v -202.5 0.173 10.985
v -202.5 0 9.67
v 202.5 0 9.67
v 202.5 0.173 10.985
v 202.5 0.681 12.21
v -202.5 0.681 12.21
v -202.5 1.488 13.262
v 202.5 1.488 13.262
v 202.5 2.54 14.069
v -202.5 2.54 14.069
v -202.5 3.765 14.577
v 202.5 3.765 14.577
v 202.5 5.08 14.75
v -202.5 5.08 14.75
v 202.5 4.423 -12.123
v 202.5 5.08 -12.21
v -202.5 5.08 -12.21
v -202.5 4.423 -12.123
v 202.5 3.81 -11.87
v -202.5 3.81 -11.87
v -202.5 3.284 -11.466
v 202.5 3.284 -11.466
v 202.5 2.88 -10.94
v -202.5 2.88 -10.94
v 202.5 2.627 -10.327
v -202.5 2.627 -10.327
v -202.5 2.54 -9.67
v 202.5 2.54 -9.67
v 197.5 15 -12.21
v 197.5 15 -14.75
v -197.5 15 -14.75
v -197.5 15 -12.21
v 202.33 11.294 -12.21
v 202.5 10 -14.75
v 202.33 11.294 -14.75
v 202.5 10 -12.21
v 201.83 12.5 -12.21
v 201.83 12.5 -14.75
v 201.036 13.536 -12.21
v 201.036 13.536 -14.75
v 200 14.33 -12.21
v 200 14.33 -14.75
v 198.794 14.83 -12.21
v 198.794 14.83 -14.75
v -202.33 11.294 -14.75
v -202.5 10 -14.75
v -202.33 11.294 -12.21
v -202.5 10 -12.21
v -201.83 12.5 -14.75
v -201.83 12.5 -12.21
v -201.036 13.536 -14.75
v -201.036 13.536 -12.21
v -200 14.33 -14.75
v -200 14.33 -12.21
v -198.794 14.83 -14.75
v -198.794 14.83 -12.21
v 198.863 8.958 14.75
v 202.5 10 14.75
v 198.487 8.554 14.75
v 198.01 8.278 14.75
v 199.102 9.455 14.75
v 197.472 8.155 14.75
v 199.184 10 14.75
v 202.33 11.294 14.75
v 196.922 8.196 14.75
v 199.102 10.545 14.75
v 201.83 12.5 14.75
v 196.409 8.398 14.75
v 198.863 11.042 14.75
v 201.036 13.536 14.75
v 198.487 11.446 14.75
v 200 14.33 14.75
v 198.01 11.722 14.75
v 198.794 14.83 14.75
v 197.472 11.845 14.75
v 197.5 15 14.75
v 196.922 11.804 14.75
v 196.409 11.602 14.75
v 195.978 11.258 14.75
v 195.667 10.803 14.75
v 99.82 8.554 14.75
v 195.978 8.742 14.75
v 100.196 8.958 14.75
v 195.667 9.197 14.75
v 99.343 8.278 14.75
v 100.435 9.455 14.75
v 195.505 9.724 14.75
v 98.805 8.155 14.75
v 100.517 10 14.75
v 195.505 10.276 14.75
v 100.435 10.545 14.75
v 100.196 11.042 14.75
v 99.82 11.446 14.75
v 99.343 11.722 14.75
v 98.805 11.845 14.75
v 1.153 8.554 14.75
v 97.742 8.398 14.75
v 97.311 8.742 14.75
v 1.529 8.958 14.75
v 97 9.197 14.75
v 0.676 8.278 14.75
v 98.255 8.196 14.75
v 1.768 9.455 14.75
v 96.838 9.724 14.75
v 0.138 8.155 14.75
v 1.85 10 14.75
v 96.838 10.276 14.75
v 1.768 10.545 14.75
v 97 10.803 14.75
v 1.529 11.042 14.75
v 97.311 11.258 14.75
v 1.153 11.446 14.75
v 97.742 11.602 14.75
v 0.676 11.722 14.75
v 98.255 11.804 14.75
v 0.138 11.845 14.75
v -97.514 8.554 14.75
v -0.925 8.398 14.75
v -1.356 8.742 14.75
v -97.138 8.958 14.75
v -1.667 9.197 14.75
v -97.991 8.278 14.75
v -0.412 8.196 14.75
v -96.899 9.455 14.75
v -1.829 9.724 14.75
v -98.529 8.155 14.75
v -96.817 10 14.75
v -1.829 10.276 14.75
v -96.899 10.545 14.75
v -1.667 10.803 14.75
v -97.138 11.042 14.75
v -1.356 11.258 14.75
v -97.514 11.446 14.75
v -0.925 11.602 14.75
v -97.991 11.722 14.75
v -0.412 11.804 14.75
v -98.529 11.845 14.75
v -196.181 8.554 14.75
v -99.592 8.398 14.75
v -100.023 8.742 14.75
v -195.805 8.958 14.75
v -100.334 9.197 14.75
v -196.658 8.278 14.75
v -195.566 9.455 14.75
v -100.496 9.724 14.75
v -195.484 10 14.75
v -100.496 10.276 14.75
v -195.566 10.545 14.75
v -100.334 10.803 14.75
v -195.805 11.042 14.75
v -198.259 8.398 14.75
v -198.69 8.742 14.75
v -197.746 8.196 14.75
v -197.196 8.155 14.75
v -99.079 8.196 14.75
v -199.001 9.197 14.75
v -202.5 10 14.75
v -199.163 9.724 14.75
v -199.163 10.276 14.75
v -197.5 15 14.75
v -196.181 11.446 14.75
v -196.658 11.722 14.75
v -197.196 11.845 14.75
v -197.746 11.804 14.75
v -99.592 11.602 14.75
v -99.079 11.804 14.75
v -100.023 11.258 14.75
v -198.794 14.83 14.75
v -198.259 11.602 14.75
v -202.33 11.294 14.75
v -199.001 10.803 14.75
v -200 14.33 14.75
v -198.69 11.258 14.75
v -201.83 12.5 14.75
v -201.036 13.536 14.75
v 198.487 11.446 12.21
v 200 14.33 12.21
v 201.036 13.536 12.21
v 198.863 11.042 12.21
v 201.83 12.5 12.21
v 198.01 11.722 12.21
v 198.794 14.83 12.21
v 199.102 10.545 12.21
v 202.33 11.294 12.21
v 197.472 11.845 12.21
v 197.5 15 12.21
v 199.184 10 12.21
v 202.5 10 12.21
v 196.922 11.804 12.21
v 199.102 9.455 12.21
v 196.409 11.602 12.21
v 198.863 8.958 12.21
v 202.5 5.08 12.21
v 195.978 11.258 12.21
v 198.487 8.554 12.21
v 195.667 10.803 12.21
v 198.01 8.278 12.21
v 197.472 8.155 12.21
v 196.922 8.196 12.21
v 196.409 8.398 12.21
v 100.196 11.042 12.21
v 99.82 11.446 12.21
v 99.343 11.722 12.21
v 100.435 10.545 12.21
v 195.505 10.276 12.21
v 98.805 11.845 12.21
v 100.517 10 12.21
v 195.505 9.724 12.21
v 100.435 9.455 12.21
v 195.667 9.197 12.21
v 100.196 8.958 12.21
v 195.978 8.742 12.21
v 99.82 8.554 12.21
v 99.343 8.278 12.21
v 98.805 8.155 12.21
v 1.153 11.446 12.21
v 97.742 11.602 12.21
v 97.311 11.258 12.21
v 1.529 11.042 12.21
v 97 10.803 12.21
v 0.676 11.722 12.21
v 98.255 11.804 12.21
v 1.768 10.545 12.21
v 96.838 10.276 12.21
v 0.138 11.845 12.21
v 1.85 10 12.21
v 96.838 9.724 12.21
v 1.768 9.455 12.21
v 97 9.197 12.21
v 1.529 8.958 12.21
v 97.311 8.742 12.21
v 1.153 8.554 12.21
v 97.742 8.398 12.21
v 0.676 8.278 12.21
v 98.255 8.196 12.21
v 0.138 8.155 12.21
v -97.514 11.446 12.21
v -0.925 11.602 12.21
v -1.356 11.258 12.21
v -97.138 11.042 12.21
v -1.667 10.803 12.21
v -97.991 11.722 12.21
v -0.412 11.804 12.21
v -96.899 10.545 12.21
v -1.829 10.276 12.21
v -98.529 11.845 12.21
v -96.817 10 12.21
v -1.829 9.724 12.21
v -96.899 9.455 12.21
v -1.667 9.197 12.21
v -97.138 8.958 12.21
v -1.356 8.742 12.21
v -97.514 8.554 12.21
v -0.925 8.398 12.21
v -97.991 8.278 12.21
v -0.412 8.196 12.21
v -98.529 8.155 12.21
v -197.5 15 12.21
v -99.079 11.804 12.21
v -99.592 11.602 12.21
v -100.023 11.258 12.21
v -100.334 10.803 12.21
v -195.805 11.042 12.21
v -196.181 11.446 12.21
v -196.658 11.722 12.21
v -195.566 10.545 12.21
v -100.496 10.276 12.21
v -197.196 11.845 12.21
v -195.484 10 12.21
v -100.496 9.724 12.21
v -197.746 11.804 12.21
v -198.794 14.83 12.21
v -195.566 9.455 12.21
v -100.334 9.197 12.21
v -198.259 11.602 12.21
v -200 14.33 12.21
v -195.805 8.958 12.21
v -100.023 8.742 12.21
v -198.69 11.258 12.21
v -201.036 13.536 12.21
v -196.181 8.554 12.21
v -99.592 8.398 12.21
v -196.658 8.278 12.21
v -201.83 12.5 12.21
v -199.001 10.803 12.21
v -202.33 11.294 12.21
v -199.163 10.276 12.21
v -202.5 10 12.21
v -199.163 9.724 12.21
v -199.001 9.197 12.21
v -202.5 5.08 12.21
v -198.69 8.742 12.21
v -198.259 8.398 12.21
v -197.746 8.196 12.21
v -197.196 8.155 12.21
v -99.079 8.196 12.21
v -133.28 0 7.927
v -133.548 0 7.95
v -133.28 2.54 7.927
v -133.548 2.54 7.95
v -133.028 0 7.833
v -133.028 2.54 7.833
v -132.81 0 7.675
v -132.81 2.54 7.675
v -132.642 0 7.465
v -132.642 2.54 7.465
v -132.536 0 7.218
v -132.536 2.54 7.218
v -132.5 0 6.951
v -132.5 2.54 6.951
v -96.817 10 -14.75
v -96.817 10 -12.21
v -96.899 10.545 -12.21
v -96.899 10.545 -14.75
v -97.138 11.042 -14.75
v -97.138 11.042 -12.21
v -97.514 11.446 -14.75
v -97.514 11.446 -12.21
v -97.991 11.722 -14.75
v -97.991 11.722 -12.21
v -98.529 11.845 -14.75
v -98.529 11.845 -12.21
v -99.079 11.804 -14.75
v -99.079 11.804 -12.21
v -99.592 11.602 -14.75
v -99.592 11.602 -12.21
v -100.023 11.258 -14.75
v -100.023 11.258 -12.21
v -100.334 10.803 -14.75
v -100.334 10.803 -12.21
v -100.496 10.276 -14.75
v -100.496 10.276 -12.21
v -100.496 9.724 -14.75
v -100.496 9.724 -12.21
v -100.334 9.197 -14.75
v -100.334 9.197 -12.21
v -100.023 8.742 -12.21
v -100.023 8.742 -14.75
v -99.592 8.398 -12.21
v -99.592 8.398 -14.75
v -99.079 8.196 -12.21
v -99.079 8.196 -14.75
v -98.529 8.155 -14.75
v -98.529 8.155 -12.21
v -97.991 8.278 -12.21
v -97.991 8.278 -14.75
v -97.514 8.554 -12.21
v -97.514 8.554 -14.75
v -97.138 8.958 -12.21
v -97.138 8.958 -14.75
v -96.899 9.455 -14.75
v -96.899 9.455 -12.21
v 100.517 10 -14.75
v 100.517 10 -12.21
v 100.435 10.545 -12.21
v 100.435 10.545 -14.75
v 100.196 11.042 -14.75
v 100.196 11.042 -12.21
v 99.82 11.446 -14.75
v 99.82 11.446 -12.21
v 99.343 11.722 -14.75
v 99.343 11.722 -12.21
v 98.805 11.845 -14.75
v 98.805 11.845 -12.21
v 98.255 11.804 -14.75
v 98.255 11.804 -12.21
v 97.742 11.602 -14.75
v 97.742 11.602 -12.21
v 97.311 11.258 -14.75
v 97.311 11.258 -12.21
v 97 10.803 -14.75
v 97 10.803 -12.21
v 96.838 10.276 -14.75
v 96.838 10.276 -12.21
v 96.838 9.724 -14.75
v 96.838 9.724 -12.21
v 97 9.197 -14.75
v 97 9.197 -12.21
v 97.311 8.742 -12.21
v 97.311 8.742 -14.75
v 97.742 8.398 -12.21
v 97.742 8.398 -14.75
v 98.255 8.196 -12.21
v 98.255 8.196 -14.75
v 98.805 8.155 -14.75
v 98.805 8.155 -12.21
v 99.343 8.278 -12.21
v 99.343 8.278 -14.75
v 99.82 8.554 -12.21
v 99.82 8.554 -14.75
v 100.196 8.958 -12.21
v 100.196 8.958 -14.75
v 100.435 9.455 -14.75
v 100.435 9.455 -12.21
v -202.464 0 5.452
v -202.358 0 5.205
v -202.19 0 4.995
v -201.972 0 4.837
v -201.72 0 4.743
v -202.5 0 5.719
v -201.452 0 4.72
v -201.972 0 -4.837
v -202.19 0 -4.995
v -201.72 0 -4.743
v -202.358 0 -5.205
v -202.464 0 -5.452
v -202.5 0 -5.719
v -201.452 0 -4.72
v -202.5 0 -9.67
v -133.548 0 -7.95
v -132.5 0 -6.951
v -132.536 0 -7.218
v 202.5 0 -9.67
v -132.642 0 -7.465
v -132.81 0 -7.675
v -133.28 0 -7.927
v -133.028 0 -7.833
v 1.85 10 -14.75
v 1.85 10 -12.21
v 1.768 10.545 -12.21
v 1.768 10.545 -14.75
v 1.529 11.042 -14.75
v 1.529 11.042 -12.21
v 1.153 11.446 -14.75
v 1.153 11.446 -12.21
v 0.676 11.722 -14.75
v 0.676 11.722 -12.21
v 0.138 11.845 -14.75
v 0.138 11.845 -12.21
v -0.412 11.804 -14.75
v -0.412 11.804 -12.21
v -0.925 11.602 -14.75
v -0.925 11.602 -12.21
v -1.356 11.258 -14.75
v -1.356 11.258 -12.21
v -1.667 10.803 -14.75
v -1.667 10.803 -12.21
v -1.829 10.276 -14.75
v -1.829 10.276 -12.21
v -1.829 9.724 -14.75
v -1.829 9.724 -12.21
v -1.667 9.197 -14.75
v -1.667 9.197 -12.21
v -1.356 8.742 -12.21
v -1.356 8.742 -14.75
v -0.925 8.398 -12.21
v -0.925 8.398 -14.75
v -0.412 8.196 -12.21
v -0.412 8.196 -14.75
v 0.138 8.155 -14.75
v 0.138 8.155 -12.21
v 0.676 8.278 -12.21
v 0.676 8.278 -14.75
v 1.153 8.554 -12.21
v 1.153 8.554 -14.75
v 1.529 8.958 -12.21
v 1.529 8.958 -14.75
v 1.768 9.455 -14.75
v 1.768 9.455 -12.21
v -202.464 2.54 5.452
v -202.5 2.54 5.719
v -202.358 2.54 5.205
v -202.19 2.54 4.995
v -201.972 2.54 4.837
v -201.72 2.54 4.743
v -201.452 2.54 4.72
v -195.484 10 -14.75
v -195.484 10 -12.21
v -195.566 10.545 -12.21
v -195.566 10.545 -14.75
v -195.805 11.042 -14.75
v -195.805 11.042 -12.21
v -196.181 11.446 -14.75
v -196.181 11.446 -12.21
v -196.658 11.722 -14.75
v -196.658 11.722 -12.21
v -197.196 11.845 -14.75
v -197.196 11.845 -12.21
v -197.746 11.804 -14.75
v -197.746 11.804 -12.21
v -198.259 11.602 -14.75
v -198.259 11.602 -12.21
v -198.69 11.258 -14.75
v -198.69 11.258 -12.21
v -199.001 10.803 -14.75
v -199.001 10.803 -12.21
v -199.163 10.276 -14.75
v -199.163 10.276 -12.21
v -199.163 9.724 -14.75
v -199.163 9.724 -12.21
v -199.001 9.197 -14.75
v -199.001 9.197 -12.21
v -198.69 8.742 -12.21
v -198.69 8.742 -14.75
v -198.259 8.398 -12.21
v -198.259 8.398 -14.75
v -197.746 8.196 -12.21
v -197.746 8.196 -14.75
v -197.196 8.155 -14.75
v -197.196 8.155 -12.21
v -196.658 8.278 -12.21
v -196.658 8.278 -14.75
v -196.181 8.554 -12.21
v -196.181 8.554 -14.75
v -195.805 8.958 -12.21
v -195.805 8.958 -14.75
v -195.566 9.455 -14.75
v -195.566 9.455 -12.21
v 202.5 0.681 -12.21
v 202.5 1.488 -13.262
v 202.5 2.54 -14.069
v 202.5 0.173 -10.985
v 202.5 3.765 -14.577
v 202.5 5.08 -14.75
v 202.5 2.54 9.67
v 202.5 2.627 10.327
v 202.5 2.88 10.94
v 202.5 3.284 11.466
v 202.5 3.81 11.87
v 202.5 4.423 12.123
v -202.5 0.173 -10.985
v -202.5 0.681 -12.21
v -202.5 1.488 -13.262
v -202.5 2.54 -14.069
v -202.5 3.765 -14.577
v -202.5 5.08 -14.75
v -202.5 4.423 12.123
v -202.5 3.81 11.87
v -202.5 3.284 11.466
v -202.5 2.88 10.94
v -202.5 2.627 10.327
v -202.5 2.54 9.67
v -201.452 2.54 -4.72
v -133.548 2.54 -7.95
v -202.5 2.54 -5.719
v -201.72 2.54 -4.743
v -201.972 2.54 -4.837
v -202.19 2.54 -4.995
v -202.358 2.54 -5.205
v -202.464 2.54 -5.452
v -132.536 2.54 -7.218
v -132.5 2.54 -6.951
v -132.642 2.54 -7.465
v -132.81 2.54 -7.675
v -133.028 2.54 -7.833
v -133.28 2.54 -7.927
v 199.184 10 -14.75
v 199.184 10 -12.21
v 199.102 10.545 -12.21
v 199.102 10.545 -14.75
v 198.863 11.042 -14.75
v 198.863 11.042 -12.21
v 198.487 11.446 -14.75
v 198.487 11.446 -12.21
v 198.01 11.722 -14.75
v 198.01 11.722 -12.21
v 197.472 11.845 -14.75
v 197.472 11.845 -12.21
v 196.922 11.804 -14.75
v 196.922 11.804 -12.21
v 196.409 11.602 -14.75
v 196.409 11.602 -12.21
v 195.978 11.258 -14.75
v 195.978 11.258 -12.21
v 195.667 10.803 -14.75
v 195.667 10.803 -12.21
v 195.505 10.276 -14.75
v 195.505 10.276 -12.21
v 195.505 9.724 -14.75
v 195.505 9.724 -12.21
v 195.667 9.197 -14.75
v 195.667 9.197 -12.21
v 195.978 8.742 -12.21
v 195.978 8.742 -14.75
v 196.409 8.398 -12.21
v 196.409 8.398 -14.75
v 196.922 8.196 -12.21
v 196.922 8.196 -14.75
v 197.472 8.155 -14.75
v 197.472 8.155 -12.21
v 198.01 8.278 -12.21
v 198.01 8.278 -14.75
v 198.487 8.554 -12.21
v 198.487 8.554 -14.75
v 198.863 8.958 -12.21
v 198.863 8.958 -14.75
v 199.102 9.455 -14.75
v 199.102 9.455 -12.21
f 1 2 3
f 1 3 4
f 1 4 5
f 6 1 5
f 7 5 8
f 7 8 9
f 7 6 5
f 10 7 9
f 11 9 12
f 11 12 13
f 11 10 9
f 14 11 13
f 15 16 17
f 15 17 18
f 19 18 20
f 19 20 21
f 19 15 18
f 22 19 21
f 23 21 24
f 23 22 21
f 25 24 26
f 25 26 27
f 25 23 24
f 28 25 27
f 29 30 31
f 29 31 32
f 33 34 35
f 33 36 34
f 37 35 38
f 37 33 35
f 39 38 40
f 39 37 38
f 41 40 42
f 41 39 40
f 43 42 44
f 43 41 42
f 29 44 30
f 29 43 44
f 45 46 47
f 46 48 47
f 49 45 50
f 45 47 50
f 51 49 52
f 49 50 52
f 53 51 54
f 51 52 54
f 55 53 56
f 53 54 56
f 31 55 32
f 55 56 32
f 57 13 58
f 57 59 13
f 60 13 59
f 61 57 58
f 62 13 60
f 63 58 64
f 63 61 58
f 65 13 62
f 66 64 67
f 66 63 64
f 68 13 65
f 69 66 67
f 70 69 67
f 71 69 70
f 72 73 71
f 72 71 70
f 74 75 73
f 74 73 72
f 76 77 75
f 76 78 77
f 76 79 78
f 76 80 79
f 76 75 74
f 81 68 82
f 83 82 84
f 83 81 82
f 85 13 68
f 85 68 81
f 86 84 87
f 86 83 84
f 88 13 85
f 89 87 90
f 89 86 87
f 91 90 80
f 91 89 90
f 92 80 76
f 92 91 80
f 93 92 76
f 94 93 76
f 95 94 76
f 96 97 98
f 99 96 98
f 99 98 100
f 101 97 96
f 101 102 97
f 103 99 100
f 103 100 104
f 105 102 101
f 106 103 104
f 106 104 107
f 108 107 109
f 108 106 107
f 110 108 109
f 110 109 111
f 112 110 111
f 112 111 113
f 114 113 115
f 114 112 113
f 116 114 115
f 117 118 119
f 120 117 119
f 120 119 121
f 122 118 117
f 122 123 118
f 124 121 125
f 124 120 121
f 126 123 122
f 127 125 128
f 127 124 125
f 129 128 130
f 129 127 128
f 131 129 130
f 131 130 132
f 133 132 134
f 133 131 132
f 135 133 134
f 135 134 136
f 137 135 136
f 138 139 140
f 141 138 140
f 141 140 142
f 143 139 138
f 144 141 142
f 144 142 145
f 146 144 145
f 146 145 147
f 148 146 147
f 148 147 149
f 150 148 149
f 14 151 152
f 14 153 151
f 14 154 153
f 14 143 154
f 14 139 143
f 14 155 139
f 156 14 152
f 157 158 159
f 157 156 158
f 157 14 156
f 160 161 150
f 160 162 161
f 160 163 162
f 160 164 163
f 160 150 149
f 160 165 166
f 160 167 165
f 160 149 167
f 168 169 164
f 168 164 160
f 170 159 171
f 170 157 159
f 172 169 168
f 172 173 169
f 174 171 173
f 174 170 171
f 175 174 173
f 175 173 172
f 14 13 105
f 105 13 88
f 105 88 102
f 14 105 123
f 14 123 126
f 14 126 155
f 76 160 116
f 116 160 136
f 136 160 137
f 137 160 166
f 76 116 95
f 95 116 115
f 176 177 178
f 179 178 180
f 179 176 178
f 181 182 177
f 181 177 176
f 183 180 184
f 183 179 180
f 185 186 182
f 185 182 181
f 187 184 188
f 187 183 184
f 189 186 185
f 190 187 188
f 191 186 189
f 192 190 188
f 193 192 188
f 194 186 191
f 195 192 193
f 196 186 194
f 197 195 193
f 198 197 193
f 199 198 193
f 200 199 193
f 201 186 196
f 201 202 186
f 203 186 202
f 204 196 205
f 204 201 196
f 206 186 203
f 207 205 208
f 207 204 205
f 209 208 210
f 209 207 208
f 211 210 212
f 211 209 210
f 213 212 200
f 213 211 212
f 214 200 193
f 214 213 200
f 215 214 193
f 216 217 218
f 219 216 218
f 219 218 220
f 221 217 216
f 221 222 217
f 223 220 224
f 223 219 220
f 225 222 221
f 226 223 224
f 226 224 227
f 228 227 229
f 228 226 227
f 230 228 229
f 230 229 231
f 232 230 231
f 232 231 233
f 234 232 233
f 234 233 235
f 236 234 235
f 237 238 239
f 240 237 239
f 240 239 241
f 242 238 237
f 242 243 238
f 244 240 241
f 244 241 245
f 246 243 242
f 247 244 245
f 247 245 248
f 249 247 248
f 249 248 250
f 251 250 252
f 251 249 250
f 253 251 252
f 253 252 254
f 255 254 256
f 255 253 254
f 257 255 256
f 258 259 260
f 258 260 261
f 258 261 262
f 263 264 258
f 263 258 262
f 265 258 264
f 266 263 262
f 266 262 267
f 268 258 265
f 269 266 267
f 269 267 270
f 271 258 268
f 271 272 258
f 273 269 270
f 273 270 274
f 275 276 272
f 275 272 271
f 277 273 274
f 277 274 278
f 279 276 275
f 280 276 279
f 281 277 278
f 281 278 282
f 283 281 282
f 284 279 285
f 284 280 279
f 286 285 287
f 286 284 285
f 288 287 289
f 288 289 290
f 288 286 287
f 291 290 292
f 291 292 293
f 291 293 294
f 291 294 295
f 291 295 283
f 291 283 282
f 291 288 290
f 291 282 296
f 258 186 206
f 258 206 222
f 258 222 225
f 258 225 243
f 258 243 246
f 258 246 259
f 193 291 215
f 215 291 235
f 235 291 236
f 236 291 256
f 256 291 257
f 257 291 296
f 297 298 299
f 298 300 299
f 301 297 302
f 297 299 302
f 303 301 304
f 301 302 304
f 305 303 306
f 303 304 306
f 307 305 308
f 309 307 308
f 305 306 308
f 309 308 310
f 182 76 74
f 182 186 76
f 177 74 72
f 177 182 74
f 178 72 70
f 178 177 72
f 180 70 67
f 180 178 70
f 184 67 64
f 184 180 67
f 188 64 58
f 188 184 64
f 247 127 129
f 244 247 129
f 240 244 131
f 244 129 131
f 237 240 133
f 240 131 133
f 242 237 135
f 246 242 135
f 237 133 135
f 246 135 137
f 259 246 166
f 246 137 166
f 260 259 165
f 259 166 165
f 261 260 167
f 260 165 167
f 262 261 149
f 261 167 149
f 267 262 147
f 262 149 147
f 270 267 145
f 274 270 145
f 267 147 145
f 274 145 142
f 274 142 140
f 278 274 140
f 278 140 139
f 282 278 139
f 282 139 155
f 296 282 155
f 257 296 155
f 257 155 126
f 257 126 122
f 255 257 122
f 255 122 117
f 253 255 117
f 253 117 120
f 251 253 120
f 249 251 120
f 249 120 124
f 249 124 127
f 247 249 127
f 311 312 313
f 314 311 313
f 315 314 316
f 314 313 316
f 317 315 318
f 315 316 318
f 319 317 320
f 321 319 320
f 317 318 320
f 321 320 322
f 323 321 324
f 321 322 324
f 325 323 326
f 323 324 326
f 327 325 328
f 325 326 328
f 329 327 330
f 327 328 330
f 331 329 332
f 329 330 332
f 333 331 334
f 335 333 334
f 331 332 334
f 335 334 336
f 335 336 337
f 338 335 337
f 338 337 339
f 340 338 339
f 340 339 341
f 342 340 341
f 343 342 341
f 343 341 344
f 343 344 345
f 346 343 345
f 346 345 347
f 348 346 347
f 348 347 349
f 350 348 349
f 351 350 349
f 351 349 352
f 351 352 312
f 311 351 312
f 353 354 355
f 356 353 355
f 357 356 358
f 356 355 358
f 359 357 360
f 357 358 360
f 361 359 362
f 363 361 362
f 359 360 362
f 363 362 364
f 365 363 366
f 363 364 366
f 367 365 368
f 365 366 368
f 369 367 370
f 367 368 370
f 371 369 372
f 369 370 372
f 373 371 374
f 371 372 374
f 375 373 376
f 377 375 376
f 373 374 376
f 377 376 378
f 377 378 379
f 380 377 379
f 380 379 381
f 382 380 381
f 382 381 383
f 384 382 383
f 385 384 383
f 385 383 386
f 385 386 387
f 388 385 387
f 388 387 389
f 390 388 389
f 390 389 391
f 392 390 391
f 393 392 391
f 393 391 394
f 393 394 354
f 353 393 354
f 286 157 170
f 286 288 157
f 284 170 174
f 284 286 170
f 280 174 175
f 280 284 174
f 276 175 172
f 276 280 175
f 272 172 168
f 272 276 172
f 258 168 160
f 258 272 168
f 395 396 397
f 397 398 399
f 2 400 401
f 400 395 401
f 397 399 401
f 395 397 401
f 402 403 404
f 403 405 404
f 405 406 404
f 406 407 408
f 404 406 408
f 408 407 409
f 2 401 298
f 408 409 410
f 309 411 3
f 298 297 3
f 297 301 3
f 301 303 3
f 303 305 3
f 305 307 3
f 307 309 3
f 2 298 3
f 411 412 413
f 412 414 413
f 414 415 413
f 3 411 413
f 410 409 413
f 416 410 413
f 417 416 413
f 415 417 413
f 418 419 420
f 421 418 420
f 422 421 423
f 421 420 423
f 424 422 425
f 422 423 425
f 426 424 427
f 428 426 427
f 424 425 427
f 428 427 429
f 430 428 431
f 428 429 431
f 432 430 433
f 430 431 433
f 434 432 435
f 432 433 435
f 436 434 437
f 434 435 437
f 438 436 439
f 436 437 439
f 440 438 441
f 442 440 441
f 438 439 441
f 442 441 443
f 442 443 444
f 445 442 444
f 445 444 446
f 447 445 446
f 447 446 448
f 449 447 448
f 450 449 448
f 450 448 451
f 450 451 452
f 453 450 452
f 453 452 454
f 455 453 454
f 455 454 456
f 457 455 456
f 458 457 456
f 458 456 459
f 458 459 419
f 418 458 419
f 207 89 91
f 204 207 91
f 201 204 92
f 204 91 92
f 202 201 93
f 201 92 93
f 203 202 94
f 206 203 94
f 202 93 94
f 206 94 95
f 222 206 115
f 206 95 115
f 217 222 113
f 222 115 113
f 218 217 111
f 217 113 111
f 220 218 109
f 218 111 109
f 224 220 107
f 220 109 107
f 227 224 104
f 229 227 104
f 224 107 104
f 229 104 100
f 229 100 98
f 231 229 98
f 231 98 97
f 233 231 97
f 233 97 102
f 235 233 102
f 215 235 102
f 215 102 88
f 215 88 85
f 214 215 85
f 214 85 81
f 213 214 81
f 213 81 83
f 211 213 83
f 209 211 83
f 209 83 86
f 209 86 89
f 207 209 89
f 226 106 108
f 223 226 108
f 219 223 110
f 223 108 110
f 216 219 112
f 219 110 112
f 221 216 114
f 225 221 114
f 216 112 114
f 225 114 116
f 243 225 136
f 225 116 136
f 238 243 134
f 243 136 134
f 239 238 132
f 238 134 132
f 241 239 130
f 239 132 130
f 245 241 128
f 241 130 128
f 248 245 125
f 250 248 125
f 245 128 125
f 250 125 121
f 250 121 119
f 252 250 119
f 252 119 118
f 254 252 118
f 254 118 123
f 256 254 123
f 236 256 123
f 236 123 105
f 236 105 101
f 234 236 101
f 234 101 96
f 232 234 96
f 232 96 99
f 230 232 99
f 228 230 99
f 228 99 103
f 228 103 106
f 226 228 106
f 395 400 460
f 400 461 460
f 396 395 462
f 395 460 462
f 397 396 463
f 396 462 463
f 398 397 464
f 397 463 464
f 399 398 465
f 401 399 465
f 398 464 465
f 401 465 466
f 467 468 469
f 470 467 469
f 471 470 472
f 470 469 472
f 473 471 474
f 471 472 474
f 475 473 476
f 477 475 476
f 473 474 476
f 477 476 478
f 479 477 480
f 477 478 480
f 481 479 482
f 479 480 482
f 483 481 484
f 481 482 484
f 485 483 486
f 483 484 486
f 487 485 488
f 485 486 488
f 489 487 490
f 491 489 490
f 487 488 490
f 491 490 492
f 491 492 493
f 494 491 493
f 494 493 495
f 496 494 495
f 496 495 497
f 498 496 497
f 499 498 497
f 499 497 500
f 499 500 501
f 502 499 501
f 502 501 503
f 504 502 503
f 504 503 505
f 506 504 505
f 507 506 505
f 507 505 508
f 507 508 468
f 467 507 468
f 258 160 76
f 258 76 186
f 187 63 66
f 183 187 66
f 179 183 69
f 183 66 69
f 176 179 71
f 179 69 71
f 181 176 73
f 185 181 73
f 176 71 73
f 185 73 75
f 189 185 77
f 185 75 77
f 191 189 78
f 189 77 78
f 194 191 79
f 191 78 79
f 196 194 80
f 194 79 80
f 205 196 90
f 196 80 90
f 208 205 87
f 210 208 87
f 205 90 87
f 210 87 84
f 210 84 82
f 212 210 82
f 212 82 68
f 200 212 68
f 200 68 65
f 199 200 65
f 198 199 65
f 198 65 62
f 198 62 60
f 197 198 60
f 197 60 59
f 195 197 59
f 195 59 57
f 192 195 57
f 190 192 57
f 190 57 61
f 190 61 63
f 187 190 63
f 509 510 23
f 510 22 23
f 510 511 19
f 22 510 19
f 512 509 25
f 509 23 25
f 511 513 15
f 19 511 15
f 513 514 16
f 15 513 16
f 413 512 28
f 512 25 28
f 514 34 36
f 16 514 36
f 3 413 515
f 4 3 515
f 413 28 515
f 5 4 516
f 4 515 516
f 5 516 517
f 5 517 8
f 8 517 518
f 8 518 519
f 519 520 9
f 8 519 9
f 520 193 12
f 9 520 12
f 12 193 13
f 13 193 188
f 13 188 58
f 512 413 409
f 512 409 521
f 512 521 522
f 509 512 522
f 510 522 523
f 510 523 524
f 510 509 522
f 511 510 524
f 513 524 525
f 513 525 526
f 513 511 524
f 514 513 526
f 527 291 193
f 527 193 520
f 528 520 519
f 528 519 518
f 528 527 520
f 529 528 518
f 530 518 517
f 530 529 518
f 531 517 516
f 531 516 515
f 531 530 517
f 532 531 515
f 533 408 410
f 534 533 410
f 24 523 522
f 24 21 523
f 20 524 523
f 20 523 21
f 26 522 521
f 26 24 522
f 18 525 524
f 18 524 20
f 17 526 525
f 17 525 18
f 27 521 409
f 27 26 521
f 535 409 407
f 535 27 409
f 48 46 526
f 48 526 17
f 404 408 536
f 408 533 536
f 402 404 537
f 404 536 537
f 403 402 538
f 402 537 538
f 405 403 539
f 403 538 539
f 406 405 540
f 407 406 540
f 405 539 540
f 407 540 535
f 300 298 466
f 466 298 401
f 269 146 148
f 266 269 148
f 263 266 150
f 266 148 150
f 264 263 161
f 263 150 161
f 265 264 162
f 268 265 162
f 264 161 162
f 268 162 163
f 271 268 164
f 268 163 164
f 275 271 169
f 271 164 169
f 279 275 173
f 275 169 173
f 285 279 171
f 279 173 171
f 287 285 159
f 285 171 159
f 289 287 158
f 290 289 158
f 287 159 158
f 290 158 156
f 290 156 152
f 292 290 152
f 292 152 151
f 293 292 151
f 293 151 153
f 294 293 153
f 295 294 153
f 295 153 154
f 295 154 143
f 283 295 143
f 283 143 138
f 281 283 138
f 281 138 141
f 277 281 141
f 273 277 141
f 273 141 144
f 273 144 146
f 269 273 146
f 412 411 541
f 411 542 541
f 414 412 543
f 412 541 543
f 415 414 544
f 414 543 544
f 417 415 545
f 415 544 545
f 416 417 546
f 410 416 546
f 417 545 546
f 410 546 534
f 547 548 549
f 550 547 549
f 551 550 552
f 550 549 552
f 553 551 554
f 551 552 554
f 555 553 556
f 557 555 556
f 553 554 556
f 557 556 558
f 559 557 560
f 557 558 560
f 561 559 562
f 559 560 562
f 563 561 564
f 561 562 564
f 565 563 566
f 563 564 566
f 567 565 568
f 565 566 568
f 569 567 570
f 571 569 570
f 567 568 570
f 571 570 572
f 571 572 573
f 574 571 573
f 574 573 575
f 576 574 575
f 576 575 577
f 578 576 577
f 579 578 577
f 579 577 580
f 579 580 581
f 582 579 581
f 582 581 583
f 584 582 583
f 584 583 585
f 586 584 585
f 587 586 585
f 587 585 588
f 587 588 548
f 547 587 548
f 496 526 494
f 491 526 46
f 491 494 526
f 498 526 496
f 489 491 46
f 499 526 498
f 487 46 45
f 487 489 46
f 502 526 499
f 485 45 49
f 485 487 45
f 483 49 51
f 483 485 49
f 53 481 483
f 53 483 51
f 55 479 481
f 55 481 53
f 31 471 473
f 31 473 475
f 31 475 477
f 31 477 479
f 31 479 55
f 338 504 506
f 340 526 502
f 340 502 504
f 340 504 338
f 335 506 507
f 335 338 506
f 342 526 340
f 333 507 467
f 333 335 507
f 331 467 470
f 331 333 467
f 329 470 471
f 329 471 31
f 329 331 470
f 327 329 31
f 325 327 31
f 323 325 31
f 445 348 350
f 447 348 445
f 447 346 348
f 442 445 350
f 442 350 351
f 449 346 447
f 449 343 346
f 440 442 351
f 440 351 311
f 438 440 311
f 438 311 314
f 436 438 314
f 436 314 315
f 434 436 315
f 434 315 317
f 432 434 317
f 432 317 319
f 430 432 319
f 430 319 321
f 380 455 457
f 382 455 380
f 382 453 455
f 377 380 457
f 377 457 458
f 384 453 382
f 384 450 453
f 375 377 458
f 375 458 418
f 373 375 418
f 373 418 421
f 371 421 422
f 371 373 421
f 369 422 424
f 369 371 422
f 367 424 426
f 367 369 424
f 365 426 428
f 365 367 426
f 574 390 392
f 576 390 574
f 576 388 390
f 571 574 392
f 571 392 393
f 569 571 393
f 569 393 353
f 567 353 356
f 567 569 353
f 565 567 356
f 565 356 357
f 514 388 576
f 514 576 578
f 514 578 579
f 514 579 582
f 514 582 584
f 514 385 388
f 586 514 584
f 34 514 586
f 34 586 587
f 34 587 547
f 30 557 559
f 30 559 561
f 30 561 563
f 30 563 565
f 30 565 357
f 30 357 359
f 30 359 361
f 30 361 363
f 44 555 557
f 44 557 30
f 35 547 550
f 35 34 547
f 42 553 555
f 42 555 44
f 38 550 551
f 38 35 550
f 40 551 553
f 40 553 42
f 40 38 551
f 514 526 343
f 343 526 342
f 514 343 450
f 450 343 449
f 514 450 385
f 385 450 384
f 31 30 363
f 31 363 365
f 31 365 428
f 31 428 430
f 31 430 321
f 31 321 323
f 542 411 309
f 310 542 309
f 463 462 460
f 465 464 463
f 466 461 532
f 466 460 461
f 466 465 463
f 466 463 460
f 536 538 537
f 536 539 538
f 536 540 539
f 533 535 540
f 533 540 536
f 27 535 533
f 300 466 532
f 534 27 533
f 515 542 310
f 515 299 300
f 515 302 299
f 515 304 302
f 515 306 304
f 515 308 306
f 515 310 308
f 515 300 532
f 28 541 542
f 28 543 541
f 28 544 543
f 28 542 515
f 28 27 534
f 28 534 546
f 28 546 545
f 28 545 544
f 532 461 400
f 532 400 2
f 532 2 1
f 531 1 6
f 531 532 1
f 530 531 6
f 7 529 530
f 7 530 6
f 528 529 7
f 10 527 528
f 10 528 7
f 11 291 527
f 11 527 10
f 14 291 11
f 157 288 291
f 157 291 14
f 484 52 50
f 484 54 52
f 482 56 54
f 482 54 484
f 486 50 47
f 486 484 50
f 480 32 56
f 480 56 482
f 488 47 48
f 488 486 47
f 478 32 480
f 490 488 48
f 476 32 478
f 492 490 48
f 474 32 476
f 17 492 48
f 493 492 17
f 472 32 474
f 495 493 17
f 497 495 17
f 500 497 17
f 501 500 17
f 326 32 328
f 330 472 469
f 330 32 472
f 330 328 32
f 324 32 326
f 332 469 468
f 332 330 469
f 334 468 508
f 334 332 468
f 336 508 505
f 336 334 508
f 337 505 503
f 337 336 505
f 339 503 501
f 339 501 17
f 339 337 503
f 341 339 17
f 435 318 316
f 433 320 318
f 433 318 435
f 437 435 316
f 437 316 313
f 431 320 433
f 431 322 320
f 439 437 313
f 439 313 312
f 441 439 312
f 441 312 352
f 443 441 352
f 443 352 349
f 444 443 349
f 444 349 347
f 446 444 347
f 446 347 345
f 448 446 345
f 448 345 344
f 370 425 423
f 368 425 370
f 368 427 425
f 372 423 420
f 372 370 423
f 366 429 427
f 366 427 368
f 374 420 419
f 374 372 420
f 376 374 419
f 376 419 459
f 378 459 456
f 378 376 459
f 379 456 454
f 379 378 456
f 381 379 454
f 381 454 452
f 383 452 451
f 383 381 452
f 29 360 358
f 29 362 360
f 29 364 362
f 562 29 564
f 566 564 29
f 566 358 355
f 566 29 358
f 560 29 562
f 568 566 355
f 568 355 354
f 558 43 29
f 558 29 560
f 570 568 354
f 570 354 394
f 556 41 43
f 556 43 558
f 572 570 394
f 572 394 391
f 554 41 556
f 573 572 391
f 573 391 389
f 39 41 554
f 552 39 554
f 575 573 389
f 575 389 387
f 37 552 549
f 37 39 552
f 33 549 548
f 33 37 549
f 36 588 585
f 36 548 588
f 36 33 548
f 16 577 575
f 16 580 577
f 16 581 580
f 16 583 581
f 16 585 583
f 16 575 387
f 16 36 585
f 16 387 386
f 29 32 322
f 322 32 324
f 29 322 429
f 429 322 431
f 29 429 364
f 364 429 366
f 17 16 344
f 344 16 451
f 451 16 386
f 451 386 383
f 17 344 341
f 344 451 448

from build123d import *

# Parameters (mm, degrees)
SKETCH1_W                      = 405
SKETCH1_H                      = 29.5
BOSS_EXTRUDE1_DEPTH            = 2.54
EDGE_FLANGE1_STRIP_W           = 15.24
EDGE_FLANGE1_STRIP_H           = 2.54
EDGE_FLANGE1_STRIP_CUT_DEPTH   = 405
EDGE_FLANGE1_STRIP_2_W         = 15.24
EDGE_FLANGE1_STRIP_2_H         = 2.54
EDGE_FLANGE1_STRIP_CUT_2_DEPTH = 405
EDGE_FLANGE1_DEPTH             = 405
EDGE_FLANGE1_BEND_DEPTH        = 405
SKETCH17_R                     = 1.85
CUT_EXTRUDE1_DEPTH             = 206.186500531
CUT_EXTRUDE2_DEPTH             = 204.589814333
FILLET1_R                      = 1
FILLET2_R                      = 5


# Sheet-metal steps are written as plain solids
with BuildPart() as part:
    # Sketch1 → Boss-Extrude1 (new body)
    with BuildSketch(Plane(origin=(0, 0, 0), x_dir=(1, 0, 0), z_dir=(0, 1, 0))):
        Rectangle(SKETCH1_W, SKETCH1_H)
    extrude(amount=BOSS_EXTRUDE1_DEPTH)

    # Edge-Flange1 strip (across the edge) → Edge-Flange1 strip cut (cut)
    with BuildSketch(Plane(origin=(202.5, 2.54, -14.75), x_dir=(0, 0, 1), z_dir=(-1, 0, 0))):
        with Locations((-2.54, -1.27)):
            Rectangle(EDGE_FLANGE1_STRIP_W, EDGE_FLANGE1_STRIP_H)
    extrude(amount=EDGE_FLANGE1_STRIP_CUT_DEPTH, mode=Mode.SUBTRACT)

    # Edge-Flange1 strip 2 (across the edge) → Edge-Flange1 strip cut 2 (cut)
    with BuildSketch(Plane(origin=(-202.5, 2.54, 14.75), x_dir=(0, 0, -1), z_dir=(1, 0, 0))):
        with Locations((-2.54, -1.27)):
            Rectangle(EDGE_FLANGE1_STRIP_2_W, EDGE_FLANGE1_STRIP_2_H)
    extrude(amount=EDGE_FLANGE1_STRIP_CUT_2_DEPTH, mode=Mode.SUBTRACT)

    # Edge-Flange1 section (across the edge) → Edge-Flange1 (add)
    with BuildSketch(Plane(origin=(202.5, 2.54, -14.75), x_dir=(0, 0, 1), z_dir=(-1, 0, 0))):
        with BuildLine():
            Line((0, 2.54), (0, 12.46))
            Line((0, 12.46), (2.54, 12.46))
            Line((2.54, 12.46), (2.54, 2.54))
            ThreePointArc((2.54, 2.54), (3.283948776, 0.743948776), (5.08, 0))
            Line((5.08, 0), (5.08, -2.54))
            ThreePointArc((5.08, -2.54), (1.487897552, -1.052102448), (0, 2.54))
        make_face()
    extrude(amount=EDGE_FLANGE1_DEPTH)

    # Edge-Flange1 section 2 (across the edge) → Edge-Flange1 bend (add)
    with BuildSketch(Plane(origin=(-202.5, 2.54, 14.75), x_dir=(0, 0, -1), z_dir=(1, 0, 0))):
        with BuildLine():
            Line((0, 2.54), (0, 12.46))
            Line((0, 12.46), (2.54, 12.46))
            Line((2.54, 12.46), (2.54, 2.54))
            ThreePointArc((2.54, 2.54), (3.283948776, 0.743948776), (5.08, 0))
            Line((5.08, 0), (5.08, -2.54))
            ThreePointArc((5.08, -2.54), (1.487897552, -1.052102448), (0, 2.54))
        make_face()
    extrude(amount=EDGE_FLANGE1_BEND_DEPTH)

    # Sketch17 → Cut-Extrude1 (cut, through all)
    with BuildSketch(Plane.XY.offset(14.75)):
        with Locations((-197.33398, 10)):
            Circle(SKETCH17_R)
        with Locations((-98.66699, 10)):
            Circle(SKETCH17_R)
        with Locations((0, 10)):
            Circle(SKETCH17_R)
        with Locations((98.66699, 10)):
            Circle(SKETCH17_R)
        with Locations((197.33398, 10)):
            Circle(SKETCH17_R)
    extrude(amount=-CUT_EXTRUDE1_DEPTH, mode=Mode.SUBTRACT)

    # Sketch18 → Cut-Extrude2 (cut, through all)
    with BuildSketch(Plane.XZ):
        Polygon((-202.5, -4.67), (-132.5, -8), (-132.5, 8), (-202.5, 4.67), align=None)
    extrude(amount=-CUT_EXTRUDE2_DEPTH, mode=Mode.SUBTRACT)

    # Fillet1
    fillet1_edges = [part.edges().sort_by_distance(p)[0] for p in [
        (-202.5, 1.27, -4.67),
        (-202.5, 1.27, 4.67),
        (-132.5, 1.27, 8),
        (-132.5, 1.27, -8),
    ]]
    fillet(fillet1_edges, radius=FILLET1_R)

    # Fillet2
    fillet2_edges = [part.edges().sort_by_distance(p)[0] for p in [
        (202.5, 15, -13.48),
        (-202.5, 15, -13.48),
        (-202.5, 15, 13.48),
        (202.5, 15, 13.48),
    ]]
    fillet(fillet2_edges, radius=FILLET2_R)


solid = part.part
